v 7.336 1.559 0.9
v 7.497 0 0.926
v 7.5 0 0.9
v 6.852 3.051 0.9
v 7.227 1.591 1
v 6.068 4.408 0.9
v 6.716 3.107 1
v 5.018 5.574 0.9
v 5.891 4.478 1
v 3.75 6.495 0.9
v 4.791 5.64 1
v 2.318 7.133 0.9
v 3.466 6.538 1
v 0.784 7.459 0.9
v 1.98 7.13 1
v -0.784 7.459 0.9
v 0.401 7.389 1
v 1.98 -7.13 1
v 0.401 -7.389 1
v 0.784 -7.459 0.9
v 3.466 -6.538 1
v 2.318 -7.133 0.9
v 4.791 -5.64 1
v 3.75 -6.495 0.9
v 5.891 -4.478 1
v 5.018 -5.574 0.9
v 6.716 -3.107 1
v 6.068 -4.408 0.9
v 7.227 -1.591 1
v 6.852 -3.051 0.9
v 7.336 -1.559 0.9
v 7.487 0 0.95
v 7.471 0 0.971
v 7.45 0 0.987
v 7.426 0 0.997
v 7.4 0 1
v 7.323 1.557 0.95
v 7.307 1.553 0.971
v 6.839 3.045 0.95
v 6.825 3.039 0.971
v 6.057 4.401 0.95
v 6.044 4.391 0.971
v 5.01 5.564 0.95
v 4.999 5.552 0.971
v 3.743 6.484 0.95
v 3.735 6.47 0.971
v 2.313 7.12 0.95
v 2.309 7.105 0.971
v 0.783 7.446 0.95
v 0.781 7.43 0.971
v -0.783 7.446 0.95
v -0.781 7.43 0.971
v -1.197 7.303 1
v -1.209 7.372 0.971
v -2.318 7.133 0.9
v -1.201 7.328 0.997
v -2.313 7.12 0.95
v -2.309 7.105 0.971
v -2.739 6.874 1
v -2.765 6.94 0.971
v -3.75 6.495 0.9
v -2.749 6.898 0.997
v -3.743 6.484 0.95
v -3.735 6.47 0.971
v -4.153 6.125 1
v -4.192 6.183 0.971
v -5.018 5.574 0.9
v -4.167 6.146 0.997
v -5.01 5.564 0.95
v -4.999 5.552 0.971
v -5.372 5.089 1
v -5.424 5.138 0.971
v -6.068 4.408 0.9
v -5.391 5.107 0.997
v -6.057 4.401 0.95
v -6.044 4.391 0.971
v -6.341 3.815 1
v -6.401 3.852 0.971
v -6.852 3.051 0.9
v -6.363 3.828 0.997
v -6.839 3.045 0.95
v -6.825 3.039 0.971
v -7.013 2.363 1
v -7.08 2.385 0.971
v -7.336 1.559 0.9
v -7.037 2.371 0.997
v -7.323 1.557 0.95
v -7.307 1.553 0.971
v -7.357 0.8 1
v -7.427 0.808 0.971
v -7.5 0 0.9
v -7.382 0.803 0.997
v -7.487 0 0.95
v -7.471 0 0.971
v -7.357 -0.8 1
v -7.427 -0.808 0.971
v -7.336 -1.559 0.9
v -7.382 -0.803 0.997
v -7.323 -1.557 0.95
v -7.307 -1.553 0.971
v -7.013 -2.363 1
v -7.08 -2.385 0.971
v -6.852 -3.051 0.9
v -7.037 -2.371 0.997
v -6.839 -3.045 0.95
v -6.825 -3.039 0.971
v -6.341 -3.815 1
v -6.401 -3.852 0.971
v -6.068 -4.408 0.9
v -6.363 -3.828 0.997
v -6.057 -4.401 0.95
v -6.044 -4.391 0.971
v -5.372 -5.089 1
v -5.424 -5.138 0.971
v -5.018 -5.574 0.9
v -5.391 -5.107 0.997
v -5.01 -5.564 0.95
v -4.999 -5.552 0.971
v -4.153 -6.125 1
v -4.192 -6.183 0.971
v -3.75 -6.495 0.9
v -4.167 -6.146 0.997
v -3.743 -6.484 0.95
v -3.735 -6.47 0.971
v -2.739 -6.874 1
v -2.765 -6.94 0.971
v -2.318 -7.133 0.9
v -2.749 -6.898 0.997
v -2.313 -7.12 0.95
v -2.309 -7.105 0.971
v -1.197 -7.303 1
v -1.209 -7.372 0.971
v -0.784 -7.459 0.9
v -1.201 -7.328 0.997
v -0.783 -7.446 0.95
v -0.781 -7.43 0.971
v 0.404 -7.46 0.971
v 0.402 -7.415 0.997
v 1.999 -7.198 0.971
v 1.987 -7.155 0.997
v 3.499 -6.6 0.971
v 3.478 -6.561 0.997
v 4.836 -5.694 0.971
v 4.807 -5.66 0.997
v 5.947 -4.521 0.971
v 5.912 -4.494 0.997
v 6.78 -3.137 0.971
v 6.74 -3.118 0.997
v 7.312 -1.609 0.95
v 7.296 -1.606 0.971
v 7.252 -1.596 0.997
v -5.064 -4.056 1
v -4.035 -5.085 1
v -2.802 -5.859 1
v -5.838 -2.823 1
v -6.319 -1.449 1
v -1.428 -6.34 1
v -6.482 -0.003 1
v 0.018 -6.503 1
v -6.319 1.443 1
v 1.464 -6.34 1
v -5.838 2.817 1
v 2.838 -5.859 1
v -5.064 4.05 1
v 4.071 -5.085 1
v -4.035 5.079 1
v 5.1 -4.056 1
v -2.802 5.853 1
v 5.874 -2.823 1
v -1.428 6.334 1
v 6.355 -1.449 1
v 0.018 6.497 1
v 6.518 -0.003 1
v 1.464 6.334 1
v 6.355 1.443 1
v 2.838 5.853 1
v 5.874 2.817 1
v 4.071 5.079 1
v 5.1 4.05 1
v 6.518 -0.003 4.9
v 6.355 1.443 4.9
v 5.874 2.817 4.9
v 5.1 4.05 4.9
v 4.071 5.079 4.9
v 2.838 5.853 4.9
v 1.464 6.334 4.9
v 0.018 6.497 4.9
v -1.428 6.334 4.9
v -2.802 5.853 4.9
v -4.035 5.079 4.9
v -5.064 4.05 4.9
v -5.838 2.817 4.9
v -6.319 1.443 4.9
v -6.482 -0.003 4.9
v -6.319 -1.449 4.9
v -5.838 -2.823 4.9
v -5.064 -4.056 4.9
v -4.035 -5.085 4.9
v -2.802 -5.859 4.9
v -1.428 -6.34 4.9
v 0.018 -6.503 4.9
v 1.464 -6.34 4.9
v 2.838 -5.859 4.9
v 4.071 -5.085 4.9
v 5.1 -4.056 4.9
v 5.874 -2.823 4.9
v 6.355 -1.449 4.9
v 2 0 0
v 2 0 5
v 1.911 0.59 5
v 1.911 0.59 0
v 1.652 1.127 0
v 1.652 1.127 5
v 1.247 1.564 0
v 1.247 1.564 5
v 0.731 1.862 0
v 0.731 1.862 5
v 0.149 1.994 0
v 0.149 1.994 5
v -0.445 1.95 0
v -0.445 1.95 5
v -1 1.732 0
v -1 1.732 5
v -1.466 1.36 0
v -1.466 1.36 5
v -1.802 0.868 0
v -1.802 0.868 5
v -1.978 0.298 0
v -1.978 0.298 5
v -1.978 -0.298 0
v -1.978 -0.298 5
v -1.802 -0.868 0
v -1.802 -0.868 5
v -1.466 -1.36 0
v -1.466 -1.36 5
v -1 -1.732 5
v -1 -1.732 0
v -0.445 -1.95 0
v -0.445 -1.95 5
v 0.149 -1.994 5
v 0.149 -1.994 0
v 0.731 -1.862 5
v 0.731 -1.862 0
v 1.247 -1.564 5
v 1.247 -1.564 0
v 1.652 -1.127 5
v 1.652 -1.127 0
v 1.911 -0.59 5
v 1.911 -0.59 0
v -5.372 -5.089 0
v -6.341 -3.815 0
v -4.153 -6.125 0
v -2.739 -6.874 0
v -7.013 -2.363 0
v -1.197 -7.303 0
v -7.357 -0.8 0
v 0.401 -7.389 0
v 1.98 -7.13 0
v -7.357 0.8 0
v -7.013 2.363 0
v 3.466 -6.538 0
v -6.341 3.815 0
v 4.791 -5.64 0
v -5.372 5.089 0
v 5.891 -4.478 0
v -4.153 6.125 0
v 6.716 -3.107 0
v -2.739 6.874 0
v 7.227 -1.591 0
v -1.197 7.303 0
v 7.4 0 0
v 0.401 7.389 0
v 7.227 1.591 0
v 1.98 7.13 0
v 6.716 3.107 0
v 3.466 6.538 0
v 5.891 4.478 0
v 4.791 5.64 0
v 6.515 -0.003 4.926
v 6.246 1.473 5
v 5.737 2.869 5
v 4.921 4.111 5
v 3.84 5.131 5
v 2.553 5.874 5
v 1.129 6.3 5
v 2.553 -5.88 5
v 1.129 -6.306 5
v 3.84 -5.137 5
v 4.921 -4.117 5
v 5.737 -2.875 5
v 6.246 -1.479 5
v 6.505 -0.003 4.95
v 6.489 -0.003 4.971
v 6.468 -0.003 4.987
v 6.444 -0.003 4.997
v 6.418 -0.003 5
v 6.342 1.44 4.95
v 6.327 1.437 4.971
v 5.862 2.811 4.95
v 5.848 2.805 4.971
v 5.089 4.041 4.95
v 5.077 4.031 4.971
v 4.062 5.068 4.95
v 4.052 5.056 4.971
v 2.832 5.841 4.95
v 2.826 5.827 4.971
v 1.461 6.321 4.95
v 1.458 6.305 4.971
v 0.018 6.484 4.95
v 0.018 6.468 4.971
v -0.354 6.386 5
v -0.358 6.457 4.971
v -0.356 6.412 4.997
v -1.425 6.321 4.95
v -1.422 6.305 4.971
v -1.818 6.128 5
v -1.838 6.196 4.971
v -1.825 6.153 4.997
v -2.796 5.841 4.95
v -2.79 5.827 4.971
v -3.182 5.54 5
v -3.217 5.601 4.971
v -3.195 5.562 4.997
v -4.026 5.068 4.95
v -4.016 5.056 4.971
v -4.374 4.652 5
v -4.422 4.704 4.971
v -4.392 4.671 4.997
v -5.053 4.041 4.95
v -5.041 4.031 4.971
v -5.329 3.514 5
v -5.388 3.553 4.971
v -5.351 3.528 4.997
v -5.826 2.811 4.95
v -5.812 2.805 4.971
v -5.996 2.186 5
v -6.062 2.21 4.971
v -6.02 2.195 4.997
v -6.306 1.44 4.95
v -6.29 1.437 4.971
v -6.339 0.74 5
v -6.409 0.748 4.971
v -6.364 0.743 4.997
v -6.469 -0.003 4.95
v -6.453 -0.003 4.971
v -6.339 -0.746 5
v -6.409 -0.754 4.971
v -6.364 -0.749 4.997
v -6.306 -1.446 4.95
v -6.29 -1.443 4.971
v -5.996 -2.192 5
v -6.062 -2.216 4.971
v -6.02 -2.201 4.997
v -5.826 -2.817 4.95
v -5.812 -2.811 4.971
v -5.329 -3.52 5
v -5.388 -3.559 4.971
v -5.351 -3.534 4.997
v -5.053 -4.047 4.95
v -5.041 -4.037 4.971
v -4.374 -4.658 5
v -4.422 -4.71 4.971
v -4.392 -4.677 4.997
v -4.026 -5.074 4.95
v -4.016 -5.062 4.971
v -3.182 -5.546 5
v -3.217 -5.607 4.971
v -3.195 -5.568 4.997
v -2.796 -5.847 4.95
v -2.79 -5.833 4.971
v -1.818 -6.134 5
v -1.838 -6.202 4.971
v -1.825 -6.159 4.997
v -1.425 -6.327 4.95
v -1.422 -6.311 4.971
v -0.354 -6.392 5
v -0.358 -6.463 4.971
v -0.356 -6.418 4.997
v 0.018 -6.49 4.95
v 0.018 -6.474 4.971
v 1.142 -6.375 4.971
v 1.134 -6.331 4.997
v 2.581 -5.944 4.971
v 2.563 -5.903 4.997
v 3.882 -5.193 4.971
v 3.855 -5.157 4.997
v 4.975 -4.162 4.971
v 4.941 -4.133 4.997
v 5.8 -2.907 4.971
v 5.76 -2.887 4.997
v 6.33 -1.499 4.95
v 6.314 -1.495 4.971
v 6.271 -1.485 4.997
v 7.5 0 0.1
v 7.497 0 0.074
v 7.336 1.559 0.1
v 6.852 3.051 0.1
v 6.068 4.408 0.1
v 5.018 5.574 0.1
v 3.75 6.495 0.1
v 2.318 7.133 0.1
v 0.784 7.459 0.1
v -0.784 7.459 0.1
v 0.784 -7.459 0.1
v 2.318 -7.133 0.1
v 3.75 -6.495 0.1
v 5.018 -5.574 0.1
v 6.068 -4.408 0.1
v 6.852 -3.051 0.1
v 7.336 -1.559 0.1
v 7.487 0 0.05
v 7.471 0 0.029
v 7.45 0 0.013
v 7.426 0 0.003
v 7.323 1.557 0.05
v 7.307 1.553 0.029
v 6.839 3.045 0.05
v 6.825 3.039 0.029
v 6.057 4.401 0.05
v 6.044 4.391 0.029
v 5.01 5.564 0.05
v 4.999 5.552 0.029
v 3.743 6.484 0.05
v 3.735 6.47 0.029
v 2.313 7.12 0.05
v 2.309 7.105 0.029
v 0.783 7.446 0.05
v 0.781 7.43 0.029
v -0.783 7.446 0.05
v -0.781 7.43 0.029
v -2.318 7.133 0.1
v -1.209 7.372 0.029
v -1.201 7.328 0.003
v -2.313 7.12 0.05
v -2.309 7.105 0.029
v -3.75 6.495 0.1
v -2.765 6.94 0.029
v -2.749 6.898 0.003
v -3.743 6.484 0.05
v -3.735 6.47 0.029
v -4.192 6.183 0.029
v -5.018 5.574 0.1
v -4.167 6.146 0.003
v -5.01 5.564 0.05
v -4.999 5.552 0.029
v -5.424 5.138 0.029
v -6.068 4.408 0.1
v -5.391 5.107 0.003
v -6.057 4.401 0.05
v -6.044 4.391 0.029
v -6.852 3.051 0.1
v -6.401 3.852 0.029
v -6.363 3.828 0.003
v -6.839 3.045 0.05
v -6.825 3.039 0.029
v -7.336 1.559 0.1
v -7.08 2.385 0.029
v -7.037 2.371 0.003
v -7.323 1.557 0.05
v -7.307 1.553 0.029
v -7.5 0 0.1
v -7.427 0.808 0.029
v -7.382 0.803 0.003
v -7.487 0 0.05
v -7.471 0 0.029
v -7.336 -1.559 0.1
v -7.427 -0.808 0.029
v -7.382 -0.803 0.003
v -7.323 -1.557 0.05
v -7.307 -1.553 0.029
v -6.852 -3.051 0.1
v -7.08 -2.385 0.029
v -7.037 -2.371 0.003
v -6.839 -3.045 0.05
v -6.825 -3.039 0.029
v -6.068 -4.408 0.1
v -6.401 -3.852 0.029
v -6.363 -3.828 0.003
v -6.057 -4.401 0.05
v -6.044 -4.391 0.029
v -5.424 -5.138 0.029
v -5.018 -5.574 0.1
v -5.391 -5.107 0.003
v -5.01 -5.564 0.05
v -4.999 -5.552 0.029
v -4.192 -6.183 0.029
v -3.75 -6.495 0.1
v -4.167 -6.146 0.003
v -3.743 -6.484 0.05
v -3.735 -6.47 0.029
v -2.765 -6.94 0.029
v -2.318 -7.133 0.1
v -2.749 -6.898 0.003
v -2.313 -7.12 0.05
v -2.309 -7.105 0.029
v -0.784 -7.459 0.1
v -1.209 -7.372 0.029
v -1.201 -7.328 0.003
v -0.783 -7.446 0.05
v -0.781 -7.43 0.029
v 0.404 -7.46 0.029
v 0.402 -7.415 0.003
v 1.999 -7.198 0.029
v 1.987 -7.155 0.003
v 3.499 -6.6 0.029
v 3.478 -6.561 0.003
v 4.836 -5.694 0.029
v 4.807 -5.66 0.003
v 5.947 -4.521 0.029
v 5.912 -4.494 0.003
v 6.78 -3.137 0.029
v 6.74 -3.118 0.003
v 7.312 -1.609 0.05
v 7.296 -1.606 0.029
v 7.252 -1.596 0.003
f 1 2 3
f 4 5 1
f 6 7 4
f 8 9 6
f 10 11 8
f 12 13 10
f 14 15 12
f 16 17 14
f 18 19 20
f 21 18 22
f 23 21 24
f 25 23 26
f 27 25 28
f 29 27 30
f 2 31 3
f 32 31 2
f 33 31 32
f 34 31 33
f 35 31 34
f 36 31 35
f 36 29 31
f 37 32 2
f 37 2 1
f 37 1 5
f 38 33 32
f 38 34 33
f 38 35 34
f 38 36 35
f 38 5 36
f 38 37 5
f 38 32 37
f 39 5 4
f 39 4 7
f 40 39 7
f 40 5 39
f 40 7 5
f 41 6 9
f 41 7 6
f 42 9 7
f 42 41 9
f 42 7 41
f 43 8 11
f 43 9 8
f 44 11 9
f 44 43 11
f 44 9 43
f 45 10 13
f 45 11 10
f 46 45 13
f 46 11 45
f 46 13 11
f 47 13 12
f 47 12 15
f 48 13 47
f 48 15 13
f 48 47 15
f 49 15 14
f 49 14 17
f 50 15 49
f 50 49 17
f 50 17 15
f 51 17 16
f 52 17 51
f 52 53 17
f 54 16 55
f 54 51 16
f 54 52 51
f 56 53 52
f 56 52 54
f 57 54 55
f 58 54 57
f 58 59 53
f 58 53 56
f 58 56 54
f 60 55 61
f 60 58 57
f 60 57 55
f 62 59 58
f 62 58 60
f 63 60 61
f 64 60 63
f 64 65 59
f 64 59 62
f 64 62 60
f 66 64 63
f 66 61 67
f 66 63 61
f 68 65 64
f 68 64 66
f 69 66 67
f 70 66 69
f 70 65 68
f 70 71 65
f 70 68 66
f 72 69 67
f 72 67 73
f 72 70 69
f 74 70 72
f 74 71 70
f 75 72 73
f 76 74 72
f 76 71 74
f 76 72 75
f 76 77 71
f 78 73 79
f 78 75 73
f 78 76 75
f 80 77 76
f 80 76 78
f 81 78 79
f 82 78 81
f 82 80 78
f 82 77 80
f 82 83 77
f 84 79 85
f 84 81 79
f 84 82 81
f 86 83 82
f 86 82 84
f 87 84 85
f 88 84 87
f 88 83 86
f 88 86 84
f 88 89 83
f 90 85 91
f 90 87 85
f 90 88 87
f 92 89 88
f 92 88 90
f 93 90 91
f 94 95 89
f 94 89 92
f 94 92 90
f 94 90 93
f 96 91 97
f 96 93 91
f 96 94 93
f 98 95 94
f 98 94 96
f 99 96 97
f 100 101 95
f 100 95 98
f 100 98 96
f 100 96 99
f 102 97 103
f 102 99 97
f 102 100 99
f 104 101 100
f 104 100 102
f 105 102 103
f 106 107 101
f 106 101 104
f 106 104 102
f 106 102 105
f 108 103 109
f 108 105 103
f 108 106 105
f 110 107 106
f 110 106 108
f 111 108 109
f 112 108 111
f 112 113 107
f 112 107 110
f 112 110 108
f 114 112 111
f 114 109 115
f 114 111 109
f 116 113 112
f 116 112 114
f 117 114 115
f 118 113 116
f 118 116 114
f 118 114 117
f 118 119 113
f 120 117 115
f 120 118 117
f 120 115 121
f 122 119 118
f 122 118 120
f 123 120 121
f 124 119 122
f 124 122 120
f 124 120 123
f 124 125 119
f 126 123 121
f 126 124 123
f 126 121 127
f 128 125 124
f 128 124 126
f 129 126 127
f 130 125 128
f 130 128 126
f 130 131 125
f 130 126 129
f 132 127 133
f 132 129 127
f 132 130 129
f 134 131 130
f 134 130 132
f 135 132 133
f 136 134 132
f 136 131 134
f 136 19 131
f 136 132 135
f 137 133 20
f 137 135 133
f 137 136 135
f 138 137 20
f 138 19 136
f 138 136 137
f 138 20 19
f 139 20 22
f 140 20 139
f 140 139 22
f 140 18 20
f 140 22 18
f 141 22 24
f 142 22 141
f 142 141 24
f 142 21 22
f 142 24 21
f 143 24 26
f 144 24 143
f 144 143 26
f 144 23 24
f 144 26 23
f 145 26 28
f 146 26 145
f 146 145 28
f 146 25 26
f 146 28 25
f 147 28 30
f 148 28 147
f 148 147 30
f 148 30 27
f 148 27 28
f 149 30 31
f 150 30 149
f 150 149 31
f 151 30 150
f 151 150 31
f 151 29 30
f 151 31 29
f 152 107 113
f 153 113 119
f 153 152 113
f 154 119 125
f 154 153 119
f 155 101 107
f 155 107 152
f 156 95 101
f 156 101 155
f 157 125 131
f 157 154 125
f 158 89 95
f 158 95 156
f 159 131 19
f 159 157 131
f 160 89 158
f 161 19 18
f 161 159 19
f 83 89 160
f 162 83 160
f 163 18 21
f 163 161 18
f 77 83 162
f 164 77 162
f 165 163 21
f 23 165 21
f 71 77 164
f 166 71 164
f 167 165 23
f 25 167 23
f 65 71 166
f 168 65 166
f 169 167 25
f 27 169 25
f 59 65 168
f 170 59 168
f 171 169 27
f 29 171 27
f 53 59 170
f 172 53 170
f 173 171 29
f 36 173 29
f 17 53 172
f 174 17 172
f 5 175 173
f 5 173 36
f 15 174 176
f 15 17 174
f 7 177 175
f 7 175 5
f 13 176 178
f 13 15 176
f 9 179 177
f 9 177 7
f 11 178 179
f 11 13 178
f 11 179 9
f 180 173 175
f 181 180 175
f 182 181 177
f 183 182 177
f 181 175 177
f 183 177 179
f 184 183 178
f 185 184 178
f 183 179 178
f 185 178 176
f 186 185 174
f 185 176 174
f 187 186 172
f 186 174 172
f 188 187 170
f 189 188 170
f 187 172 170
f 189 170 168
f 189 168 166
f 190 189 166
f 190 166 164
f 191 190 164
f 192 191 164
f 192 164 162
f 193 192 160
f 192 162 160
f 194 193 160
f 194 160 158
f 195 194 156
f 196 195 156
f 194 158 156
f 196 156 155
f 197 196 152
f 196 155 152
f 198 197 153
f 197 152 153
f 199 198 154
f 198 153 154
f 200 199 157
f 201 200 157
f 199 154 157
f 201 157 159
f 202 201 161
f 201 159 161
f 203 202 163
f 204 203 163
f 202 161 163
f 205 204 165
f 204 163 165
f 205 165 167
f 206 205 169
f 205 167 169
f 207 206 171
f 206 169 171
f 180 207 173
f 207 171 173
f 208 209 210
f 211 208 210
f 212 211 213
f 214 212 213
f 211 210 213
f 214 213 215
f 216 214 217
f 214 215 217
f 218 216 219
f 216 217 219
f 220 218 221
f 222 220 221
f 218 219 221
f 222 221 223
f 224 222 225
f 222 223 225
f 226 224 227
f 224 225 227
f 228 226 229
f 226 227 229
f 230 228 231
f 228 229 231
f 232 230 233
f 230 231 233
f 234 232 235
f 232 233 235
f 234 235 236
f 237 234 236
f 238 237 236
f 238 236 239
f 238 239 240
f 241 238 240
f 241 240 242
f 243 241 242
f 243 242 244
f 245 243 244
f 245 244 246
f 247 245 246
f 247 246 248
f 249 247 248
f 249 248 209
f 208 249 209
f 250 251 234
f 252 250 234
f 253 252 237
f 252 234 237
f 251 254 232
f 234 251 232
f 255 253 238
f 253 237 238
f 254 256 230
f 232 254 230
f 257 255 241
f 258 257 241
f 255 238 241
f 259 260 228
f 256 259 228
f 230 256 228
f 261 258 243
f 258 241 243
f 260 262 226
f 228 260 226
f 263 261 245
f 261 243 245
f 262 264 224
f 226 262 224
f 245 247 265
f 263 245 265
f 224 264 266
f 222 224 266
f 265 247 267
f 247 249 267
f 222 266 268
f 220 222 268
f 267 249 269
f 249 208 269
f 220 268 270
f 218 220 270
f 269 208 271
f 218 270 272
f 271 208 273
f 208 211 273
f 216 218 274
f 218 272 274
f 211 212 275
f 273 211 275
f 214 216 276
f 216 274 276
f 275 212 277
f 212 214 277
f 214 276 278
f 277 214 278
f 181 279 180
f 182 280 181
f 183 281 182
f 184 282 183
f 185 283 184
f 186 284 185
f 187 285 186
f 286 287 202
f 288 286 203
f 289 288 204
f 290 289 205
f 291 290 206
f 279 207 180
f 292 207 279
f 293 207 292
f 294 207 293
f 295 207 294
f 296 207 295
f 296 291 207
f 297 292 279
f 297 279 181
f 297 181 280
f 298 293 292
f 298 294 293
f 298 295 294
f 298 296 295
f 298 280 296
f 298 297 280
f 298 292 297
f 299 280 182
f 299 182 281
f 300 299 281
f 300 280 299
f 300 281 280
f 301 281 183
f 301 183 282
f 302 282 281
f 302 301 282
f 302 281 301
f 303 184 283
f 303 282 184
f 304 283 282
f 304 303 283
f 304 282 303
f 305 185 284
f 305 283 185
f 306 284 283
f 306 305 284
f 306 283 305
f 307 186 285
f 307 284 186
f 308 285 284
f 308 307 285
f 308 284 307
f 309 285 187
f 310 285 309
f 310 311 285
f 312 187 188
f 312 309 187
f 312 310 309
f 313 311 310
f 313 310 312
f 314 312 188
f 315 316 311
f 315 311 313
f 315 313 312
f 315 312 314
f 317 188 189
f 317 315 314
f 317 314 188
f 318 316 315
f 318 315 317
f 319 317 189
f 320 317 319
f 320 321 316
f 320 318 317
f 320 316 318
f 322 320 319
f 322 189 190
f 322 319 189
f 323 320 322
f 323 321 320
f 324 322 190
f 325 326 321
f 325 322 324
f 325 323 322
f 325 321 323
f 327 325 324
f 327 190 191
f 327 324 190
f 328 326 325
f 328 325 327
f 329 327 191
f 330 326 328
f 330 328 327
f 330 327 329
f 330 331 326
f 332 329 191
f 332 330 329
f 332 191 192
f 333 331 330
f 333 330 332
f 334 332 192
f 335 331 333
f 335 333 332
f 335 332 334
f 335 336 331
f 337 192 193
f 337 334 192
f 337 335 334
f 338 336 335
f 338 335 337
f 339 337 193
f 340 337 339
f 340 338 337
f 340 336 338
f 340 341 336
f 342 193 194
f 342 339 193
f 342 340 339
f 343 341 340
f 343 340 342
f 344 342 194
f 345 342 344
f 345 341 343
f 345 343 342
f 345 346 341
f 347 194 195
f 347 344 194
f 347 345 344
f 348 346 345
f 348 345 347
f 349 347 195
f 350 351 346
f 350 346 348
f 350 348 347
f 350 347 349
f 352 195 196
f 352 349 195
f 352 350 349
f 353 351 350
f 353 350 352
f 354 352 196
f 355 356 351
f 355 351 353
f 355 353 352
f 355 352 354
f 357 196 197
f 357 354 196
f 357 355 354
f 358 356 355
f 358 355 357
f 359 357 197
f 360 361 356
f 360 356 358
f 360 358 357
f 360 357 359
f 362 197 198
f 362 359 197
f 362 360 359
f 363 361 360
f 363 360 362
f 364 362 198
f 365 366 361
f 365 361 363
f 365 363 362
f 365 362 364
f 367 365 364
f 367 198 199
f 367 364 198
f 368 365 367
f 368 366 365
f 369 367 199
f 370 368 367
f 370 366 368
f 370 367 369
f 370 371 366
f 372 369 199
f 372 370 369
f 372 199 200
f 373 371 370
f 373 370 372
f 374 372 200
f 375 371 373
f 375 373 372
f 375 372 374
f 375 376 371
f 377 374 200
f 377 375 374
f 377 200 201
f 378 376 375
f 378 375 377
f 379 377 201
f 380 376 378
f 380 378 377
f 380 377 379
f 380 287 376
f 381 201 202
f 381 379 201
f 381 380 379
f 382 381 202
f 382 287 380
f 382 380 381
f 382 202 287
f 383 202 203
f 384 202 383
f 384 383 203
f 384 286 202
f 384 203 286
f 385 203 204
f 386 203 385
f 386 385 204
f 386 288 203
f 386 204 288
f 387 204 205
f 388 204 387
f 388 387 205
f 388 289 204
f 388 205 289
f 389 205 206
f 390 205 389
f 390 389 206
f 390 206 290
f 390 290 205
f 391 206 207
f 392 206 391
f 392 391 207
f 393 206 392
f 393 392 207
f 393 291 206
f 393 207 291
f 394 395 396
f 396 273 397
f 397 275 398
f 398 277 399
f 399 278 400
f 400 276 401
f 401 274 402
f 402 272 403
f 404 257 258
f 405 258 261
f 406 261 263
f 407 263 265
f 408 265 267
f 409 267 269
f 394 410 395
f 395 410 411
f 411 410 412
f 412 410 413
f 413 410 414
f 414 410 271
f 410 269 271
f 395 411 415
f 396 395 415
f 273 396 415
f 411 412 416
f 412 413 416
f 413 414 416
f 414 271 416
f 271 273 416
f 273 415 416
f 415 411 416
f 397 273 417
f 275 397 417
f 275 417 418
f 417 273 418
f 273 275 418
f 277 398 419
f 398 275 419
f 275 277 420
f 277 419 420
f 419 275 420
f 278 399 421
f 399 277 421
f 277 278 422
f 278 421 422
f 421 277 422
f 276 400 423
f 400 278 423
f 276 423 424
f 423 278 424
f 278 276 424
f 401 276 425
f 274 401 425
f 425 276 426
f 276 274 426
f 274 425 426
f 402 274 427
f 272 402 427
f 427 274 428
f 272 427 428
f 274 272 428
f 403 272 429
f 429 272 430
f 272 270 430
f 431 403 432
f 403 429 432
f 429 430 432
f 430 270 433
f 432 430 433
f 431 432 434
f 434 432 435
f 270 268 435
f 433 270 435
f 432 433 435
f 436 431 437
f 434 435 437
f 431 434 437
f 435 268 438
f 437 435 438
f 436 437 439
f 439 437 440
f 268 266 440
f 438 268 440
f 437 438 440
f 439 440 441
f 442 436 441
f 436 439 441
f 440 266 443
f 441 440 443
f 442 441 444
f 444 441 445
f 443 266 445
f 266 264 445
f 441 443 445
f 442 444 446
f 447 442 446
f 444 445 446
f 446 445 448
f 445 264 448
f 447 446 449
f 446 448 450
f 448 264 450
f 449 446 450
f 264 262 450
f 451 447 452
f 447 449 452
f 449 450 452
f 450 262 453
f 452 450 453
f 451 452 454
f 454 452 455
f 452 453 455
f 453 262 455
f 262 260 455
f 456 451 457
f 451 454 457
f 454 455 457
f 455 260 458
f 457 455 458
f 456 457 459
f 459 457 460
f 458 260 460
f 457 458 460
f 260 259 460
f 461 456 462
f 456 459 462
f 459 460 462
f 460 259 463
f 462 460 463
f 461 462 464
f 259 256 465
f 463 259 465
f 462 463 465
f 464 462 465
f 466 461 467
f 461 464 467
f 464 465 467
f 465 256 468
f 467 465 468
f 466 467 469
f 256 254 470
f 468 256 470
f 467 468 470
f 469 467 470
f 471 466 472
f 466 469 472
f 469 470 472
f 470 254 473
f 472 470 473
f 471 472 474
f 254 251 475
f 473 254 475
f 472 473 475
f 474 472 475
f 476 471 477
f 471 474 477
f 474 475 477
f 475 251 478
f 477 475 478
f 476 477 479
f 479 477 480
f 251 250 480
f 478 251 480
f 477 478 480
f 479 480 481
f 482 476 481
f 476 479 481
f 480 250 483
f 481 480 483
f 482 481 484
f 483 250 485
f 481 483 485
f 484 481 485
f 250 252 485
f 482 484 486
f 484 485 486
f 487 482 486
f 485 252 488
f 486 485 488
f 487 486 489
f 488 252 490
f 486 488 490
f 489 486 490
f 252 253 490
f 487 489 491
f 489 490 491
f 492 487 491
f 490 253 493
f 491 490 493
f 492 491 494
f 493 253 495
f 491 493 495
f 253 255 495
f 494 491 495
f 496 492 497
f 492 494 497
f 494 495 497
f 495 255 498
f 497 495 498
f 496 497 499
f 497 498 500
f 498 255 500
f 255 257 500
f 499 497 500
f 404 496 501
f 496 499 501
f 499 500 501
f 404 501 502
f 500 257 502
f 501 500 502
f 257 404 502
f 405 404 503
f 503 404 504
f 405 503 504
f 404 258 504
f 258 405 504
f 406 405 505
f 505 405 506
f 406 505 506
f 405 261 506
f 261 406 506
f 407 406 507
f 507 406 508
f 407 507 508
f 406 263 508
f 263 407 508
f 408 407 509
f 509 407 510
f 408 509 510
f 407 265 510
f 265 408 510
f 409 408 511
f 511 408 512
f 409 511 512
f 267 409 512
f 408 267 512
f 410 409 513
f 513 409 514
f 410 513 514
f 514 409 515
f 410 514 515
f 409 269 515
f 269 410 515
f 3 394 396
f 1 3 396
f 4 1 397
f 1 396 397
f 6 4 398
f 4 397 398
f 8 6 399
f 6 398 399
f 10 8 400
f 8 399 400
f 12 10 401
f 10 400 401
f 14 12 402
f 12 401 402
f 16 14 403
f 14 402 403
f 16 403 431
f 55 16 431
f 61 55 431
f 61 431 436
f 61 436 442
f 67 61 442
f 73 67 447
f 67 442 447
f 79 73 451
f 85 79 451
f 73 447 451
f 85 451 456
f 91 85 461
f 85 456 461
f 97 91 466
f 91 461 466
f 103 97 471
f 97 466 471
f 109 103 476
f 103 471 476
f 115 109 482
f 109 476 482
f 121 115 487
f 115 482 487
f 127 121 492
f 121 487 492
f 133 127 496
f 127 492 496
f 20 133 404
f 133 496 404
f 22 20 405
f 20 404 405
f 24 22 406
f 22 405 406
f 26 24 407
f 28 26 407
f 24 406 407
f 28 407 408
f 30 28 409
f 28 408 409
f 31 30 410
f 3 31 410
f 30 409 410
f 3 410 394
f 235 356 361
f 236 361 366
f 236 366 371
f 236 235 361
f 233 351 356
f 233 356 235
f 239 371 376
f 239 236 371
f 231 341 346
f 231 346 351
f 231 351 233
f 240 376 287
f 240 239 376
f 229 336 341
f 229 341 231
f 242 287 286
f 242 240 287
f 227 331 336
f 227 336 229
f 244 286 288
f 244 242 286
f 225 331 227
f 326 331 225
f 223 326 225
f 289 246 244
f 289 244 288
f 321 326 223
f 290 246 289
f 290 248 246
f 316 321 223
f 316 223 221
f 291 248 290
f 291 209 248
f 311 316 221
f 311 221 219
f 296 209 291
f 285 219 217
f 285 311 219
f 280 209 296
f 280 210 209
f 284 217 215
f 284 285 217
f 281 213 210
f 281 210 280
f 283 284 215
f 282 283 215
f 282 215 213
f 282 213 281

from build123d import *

# Parameters (mm, degrees)
SKETCH_R     = 7.5
PAD_DEPTH    = 1
SKETCH001_R  = 6.5
PAD001_DEPTH = 4
SKETCH002_R  = 2
POCKET_DEPTH = 5.001
FILLET_R     = 0.1


with BuildPart() as part:
    # Sketch → Pad (new body)
    with BuildSketch(Plane.XY):
        Circle(SKETCH_R)
    extrude(amount=PAD_DEPTH)

    # Sketch001 → Pad001 (new body)
    with BuildSketch(Plane.XY.offset(1)):
        with Locations((0.018028, -0.002987)):
            Circle(SKETCH001_R)
    extrude(amount=PAD001_DEPTH)

    # Sketch002 → Pocket (cut, through all)
    with BuildSketch(Plane.XY.offset(5)):
        Circle(SKETCH002_R)
    extrude(amount=-POCKET_DEPTH, mode=Mode.SUBTRACT)

    # Fillet
    fillet_edges = [part.edges().sort_by_distance(p)[0] for p in [
        (-7.5, 0, 1),
        (-7.5, 0, 0),
        (-6.481972, -0.002987, 5),
    ]]
    fillet(fillet_edges, radius=FILLET_R)


solid = part.part
